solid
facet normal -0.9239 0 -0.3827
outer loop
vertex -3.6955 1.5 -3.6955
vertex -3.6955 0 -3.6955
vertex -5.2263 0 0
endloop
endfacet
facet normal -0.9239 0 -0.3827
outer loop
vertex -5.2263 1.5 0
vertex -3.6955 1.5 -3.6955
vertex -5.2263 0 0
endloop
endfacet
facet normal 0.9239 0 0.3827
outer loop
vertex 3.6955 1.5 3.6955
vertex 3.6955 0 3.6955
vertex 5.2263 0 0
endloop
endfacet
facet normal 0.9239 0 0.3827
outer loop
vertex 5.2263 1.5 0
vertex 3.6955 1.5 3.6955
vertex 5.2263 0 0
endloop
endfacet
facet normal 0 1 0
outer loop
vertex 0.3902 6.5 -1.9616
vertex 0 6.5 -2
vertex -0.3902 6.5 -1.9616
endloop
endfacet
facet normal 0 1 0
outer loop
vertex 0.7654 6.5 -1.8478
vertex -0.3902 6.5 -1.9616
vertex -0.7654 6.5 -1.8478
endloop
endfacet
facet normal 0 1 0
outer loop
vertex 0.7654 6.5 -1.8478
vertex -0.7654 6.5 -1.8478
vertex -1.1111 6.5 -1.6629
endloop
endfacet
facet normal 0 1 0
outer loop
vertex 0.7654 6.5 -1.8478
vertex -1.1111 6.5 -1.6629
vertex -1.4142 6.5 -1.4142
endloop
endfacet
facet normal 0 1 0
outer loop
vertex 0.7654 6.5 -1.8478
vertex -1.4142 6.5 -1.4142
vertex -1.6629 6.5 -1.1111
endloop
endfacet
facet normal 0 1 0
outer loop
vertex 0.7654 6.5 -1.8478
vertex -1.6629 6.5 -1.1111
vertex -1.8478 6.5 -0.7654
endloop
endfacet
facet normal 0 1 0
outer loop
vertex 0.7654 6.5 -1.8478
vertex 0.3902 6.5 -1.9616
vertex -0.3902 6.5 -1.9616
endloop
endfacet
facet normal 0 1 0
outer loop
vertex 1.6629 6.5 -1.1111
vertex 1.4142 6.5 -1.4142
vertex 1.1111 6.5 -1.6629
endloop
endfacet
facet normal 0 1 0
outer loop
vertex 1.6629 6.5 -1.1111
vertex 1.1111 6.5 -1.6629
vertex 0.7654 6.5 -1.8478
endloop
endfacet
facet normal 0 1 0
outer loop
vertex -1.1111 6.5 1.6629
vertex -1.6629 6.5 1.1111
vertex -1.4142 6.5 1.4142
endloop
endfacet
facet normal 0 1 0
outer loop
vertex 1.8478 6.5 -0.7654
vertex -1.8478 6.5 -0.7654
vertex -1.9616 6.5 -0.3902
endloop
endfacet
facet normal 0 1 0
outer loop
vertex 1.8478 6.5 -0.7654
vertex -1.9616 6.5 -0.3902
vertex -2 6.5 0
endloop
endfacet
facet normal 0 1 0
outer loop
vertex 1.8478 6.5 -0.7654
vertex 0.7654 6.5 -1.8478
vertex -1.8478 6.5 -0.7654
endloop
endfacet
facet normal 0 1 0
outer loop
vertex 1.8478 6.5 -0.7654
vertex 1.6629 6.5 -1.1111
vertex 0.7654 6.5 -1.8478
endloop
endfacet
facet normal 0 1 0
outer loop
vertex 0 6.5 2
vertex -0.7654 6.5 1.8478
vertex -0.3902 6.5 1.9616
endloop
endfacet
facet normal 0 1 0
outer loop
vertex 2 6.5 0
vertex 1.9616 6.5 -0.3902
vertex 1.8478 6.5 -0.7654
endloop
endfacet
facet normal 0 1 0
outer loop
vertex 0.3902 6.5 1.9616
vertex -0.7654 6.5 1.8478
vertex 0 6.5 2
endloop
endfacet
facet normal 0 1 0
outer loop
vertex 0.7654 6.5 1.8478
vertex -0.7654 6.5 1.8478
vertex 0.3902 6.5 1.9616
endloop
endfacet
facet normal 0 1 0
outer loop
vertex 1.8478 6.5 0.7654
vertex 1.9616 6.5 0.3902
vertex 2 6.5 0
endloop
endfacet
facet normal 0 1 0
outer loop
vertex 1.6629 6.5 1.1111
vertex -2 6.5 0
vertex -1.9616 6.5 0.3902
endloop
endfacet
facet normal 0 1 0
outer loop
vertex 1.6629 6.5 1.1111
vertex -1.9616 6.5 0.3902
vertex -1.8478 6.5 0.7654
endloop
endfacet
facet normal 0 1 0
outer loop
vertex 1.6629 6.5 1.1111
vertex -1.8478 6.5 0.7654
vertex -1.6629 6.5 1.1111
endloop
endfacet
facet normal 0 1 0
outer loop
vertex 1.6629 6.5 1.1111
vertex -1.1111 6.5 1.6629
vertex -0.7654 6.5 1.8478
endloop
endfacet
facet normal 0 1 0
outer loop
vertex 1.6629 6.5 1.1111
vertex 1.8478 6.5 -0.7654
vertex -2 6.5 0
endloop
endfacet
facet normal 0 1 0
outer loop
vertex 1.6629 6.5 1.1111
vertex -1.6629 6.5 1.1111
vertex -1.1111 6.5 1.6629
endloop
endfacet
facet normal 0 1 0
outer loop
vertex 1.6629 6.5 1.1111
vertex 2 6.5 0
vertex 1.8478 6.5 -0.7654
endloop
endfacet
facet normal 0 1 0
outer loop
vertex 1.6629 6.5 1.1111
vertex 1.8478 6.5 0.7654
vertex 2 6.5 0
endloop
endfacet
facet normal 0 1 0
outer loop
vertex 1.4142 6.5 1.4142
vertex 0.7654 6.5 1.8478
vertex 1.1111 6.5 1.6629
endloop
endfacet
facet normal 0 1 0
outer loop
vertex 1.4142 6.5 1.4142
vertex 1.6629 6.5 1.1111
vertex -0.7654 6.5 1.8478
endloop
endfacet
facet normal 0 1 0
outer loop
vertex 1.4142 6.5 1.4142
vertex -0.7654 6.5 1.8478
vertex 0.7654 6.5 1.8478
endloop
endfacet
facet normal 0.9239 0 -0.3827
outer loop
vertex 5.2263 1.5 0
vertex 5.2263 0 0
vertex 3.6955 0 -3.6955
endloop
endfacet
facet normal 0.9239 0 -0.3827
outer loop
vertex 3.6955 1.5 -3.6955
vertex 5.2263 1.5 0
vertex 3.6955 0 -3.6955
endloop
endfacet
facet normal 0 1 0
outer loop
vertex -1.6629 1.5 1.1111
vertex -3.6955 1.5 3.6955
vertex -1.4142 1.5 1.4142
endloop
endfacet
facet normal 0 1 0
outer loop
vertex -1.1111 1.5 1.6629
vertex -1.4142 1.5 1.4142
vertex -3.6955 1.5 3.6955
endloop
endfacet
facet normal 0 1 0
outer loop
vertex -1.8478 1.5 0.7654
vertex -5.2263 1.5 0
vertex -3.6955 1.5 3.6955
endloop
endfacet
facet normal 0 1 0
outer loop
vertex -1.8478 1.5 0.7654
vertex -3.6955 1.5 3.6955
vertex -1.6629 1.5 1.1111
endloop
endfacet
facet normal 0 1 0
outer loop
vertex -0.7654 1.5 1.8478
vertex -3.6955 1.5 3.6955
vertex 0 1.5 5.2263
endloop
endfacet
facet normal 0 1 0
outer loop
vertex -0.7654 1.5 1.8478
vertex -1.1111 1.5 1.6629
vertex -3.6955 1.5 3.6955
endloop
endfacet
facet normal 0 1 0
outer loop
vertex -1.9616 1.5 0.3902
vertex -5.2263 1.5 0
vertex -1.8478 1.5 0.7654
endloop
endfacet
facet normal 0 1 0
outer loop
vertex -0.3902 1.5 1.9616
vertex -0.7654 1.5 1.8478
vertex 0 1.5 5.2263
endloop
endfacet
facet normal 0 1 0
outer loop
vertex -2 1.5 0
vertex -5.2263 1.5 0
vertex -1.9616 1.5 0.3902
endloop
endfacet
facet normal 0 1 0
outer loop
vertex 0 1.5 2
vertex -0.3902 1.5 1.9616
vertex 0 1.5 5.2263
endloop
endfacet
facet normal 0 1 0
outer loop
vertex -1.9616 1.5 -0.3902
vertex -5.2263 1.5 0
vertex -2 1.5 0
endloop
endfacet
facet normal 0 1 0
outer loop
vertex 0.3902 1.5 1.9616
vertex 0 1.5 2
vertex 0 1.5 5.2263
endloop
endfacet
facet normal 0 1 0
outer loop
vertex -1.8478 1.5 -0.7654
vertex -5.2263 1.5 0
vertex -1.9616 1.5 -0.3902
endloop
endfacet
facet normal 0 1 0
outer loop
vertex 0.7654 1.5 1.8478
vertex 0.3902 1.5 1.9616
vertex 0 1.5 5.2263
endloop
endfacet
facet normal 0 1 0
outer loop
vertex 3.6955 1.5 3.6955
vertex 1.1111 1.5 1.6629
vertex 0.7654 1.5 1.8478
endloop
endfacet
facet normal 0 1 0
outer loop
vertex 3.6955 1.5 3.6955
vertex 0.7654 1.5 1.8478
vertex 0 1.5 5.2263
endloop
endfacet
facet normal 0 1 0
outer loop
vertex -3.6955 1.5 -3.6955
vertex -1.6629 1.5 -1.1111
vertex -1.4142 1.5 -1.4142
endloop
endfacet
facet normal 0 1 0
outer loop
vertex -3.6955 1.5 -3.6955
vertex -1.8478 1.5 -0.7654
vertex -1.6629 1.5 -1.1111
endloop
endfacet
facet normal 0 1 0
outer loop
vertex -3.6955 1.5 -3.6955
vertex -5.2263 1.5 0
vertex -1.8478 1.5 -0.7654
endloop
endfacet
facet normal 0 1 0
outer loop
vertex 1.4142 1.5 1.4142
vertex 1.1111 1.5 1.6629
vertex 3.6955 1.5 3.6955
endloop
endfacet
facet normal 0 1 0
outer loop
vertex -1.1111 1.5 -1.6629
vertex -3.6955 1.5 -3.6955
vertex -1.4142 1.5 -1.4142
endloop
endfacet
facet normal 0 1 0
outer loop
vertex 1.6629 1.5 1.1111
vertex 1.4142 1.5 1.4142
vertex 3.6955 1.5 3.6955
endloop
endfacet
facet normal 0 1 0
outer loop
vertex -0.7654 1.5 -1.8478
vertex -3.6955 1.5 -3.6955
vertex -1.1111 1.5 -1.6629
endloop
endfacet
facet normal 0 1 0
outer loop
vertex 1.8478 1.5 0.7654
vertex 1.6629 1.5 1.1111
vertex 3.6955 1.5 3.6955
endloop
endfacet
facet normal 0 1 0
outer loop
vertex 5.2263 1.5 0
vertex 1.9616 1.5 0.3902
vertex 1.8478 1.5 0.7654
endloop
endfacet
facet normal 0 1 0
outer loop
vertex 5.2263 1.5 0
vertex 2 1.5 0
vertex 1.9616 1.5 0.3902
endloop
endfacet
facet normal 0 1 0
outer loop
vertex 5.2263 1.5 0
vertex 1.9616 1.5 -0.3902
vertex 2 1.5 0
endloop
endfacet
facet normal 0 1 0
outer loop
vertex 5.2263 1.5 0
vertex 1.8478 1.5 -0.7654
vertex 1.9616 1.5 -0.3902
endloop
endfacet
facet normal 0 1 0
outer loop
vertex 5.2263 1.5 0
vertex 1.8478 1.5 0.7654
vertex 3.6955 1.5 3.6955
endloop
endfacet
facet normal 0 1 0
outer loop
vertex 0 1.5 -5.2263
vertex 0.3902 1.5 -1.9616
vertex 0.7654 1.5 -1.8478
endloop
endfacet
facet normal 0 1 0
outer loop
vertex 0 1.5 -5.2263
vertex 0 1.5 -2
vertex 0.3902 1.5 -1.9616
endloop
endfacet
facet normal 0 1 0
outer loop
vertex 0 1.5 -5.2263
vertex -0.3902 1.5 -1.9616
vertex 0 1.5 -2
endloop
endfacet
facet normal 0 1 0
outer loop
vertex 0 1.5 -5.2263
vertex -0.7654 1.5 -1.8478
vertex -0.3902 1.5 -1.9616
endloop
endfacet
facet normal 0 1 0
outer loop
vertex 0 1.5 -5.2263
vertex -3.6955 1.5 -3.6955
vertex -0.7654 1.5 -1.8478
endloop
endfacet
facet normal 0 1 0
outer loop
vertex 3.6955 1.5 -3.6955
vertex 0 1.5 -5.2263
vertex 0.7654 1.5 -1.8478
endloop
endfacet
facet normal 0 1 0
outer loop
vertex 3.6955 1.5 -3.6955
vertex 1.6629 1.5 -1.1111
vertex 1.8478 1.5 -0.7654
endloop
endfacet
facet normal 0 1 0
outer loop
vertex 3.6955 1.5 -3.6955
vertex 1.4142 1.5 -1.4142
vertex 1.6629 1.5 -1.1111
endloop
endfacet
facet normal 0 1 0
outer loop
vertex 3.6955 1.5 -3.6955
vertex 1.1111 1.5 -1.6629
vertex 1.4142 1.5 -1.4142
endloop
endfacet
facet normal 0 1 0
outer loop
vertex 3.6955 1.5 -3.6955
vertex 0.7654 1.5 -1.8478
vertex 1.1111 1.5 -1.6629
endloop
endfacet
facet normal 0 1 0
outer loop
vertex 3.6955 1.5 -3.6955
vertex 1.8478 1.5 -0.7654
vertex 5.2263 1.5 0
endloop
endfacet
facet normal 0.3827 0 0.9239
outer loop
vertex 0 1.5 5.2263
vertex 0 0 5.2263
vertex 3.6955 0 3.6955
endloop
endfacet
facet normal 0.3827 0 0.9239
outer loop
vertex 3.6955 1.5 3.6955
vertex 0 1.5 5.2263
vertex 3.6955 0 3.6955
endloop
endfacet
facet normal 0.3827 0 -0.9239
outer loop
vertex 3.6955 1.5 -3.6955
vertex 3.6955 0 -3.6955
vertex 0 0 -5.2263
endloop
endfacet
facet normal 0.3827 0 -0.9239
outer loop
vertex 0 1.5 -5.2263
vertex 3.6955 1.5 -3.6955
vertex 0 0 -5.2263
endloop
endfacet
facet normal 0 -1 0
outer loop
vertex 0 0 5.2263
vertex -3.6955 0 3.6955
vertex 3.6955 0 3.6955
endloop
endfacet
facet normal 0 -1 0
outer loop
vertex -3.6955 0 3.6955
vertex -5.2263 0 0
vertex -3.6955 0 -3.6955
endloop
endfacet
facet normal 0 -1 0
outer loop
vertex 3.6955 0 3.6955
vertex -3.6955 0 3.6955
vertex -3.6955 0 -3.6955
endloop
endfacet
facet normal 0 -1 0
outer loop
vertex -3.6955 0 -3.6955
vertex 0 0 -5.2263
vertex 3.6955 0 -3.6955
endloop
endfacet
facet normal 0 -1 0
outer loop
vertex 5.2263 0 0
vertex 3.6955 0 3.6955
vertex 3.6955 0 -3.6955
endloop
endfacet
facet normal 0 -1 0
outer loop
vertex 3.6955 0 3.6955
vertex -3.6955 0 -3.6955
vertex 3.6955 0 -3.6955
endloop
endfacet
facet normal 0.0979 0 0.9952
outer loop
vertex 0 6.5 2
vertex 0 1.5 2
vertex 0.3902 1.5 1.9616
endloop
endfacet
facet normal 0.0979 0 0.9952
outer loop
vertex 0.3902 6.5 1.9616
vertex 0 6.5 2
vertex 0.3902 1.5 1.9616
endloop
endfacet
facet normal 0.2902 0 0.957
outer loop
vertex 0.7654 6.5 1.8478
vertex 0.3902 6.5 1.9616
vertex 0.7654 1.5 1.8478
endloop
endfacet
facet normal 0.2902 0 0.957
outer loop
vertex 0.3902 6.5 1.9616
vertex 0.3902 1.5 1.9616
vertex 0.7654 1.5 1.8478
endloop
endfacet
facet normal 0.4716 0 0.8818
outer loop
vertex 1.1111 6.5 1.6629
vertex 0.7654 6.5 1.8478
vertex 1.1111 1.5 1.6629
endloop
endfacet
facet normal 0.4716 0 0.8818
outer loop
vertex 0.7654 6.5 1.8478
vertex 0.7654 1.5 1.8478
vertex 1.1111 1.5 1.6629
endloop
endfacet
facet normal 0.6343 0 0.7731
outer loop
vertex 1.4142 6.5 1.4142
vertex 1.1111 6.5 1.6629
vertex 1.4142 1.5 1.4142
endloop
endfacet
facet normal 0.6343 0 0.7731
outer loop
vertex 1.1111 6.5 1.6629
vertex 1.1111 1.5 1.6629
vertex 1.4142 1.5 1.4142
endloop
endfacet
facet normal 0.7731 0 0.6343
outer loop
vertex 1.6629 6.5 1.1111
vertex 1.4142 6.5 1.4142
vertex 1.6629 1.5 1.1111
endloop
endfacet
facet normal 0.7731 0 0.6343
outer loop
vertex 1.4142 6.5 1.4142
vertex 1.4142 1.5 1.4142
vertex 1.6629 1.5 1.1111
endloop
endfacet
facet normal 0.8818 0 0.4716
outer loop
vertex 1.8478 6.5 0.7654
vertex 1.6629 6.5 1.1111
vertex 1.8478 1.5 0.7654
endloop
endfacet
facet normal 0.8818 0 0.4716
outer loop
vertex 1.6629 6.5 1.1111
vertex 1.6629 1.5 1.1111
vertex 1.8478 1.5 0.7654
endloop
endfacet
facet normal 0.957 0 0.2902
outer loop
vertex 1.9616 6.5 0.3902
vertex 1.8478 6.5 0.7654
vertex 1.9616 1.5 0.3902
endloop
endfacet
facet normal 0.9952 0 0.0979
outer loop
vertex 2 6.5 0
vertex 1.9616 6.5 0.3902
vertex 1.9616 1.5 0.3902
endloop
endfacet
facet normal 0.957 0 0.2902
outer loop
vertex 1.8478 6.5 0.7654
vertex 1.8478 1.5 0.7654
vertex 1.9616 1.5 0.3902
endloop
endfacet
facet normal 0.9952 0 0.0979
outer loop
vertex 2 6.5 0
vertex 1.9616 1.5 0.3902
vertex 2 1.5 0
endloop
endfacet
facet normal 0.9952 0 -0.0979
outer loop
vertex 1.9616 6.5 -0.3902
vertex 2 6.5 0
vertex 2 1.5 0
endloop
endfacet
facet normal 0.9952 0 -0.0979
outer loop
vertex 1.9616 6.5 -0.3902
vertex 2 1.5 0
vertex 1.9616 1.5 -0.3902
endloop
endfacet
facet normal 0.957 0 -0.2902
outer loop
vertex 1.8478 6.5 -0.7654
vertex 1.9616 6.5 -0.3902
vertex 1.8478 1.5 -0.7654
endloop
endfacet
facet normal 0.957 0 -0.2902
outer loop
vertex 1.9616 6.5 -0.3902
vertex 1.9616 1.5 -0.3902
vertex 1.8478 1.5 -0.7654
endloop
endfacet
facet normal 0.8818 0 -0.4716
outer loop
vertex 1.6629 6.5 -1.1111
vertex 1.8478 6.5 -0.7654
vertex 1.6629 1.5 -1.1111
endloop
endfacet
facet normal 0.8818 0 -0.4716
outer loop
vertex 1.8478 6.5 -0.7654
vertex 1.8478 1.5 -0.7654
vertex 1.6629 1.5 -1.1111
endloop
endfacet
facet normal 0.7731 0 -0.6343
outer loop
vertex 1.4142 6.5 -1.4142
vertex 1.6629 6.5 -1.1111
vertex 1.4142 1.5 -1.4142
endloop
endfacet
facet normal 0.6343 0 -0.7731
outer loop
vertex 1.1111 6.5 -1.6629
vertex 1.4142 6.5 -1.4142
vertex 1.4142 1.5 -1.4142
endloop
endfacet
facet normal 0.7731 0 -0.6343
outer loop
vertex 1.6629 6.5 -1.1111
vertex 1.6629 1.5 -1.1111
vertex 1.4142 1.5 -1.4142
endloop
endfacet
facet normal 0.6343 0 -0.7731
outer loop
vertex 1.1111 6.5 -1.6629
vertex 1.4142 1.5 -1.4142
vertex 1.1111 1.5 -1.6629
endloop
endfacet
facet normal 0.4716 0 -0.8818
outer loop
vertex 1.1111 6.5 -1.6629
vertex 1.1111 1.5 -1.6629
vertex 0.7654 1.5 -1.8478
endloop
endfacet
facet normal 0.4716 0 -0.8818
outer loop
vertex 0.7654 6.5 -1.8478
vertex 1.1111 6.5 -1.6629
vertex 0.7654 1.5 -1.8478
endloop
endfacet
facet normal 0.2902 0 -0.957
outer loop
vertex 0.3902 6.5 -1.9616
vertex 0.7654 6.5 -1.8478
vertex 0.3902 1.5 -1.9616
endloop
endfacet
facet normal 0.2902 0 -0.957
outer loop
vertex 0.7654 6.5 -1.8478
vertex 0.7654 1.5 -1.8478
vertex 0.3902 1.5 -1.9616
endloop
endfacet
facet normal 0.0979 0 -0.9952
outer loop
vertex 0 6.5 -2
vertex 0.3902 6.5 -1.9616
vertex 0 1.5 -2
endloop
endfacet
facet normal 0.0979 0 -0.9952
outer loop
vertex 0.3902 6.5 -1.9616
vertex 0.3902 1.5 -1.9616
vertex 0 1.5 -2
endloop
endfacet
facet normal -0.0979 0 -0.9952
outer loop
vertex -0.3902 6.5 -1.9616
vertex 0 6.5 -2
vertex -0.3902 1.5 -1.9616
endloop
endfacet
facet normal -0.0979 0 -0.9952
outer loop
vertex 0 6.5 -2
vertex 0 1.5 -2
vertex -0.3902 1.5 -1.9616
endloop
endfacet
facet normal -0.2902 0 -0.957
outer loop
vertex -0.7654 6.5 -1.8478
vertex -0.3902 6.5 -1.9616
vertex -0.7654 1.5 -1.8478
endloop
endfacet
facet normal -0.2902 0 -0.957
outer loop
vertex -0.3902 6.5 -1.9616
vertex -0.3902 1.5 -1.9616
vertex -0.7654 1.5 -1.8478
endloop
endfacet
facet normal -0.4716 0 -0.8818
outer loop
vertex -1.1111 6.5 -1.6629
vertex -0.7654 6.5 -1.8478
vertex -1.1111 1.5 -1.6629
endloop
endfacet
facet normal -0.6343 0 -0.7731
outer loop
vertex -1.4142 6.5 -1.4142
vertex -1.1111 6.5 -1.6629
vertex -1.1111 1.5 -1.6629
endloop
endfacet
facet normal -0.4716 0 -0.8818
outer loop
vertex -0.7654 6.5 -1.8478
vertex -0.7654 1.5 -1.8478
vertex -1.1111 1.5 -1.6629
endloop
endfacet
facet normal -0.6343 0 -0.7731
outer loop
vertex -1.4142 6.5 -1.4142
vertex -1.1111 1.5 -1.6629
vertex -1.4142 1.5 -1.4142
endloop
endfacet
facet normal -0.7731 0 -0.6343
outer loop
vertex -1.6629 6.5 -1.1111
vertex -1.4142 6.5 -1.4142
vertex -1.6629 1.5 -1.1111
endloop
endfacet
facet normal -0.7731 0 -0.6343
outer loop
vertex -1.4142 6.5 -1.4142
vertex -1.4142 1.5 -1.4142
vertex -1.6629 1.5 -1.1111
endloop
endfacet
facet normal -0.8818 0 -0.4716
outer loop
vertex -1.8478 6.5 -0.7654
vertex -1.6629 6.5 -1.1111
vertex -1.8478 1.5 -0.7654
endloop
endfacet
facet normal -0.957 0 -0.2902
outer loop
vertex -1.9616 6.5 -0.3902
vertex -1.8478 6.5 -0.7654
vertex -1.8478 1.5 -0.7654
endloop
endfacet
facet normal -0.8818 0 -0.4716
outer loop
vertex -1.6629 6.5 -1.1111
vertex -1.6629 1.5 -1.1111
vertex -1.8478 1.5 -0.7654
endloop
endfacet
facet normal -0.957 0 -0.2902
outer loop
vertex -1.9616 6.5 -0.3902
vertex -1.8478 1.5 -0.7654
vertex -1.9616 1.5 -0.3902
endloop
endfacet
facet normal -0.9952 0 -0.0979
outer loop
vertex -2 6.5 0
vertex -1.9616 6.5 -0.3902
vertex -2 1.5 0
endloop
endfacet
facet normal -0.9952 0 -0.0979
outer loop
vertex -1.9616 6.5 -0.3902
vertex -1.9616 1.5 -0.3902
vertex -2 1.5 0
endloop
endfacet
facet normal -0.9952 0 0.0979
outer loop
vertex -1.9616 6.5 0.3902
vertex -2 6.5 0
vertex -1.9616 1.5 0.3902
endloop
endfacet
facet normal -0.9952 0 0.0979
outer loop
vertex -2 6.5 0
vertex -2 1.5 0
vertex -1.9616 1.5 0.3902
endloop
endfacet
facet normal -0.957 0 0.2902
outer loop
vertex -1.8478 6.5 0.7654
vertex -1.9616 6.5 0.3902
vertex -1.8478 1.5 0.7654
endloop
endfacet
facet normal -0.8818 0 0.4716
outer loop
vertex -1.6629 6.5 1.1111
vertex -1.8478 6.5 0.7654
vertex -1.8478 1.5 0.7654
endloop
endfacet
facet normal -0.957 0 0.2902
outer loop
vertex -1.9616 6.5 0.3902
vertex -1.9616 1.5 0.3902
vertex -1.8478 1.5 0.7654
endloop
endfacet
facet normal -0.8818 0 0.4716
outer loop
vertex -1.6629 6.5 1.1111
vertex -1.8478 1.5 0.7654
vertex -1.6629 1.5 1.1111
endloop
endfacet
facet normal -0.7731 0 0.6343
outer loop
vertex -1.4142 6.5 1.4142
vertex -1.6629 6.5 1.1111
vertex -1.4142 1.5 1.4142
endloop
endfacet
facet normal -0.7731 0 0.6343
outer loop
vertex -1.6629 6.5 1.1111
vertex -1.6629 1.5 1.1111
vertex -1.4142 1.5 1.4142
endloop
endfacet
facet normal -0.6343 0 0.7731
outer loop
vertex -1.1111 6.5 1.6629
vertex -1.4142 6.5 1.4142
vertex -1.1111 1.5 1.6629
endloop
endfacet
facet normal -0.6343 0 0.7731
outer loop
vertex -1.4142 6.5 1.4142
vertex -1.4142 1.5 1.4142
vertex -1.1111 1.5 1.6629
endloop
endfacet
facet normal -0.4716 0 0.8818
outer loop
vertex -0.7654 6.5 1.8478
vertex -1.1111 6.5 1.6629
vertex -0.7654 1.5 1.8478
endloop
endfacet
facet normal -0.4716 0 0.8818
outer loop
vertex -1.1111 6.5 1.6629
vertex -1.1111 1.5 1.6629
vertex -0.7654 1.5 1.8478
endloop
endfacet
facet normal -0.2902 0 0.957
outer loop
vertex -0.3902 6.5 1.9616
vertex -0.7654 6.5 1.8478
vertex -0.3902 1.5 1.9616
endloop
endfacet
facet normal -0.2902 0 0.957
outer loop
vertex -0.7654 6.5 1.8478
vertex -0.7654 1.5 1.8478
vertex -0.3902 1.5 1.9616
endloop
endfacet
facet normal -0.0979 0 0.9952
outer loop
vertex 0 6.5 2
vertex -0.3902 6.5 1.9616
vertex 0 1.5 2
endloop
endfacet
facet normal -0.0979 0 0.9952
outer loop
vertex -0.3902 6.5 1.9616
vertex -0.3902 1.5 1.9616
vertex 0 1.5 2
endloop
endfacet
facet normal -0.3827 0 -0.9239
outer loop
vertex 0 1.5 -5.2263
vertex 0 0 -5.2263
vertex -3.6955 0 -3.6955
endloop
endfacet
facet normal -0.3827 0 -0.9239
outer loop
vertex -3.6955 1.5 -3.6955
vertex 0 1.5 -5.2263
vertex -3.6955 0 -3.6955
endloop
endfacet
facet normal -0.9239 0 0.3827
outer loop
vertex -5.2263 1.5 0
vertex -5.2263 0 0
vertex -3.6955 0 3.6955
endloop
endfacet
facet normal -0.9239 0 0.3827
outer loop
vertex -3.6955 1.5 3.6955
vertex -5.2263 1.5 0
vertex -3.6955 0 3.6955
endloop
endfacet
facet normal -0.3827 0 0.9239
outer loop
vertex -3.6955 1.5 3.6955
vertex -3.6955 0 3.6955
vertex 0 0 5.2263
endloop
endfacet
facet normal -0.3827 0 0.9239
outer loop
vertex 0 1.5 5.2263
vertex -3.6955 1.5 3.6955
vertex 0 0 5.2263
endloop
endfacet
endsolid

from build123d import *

# Parameters (mm, degrees)
EXTRUDE_1_DEPTH = 1.5
SKETCH_2_R      = 2
EXTRUDE_2_DEPTH = 5


with BuildPart() as part:
    # 草图1 → 凸台-拉伸1 (new body)
    with BuildSketch(Plane(origin=(0, 0, 0), x_dir=(1, 0, 0), z_dir=(0, 1, 0))):
        Polygon((5.22625186, 0), (3.69551813, 3.69551813), (0, 5.22625186), (-3.69551813, 3.69551813), (-5.22625186, 0), (-3.69551813, -3.69551813), (0, -5.22625186), (3.69551813, -3.69551813), align=None)
    extrude(amount=EXTRUDE_1_DEPTH)

    # 草图2 → 凸台-拉伸2 (add)
    with BuildSketch(Plane(origin=(0, 1.5, 0), x_dir=(1, 0, 0), z_dir=(0, 1, 0))):
        with Locations(Location((0, 0, 0), (0, 0, 270))):
            Circle(SKETCH_2_R)
    extrude(amount=EXTRUDE_2_DEPTH)


solid = part.part
